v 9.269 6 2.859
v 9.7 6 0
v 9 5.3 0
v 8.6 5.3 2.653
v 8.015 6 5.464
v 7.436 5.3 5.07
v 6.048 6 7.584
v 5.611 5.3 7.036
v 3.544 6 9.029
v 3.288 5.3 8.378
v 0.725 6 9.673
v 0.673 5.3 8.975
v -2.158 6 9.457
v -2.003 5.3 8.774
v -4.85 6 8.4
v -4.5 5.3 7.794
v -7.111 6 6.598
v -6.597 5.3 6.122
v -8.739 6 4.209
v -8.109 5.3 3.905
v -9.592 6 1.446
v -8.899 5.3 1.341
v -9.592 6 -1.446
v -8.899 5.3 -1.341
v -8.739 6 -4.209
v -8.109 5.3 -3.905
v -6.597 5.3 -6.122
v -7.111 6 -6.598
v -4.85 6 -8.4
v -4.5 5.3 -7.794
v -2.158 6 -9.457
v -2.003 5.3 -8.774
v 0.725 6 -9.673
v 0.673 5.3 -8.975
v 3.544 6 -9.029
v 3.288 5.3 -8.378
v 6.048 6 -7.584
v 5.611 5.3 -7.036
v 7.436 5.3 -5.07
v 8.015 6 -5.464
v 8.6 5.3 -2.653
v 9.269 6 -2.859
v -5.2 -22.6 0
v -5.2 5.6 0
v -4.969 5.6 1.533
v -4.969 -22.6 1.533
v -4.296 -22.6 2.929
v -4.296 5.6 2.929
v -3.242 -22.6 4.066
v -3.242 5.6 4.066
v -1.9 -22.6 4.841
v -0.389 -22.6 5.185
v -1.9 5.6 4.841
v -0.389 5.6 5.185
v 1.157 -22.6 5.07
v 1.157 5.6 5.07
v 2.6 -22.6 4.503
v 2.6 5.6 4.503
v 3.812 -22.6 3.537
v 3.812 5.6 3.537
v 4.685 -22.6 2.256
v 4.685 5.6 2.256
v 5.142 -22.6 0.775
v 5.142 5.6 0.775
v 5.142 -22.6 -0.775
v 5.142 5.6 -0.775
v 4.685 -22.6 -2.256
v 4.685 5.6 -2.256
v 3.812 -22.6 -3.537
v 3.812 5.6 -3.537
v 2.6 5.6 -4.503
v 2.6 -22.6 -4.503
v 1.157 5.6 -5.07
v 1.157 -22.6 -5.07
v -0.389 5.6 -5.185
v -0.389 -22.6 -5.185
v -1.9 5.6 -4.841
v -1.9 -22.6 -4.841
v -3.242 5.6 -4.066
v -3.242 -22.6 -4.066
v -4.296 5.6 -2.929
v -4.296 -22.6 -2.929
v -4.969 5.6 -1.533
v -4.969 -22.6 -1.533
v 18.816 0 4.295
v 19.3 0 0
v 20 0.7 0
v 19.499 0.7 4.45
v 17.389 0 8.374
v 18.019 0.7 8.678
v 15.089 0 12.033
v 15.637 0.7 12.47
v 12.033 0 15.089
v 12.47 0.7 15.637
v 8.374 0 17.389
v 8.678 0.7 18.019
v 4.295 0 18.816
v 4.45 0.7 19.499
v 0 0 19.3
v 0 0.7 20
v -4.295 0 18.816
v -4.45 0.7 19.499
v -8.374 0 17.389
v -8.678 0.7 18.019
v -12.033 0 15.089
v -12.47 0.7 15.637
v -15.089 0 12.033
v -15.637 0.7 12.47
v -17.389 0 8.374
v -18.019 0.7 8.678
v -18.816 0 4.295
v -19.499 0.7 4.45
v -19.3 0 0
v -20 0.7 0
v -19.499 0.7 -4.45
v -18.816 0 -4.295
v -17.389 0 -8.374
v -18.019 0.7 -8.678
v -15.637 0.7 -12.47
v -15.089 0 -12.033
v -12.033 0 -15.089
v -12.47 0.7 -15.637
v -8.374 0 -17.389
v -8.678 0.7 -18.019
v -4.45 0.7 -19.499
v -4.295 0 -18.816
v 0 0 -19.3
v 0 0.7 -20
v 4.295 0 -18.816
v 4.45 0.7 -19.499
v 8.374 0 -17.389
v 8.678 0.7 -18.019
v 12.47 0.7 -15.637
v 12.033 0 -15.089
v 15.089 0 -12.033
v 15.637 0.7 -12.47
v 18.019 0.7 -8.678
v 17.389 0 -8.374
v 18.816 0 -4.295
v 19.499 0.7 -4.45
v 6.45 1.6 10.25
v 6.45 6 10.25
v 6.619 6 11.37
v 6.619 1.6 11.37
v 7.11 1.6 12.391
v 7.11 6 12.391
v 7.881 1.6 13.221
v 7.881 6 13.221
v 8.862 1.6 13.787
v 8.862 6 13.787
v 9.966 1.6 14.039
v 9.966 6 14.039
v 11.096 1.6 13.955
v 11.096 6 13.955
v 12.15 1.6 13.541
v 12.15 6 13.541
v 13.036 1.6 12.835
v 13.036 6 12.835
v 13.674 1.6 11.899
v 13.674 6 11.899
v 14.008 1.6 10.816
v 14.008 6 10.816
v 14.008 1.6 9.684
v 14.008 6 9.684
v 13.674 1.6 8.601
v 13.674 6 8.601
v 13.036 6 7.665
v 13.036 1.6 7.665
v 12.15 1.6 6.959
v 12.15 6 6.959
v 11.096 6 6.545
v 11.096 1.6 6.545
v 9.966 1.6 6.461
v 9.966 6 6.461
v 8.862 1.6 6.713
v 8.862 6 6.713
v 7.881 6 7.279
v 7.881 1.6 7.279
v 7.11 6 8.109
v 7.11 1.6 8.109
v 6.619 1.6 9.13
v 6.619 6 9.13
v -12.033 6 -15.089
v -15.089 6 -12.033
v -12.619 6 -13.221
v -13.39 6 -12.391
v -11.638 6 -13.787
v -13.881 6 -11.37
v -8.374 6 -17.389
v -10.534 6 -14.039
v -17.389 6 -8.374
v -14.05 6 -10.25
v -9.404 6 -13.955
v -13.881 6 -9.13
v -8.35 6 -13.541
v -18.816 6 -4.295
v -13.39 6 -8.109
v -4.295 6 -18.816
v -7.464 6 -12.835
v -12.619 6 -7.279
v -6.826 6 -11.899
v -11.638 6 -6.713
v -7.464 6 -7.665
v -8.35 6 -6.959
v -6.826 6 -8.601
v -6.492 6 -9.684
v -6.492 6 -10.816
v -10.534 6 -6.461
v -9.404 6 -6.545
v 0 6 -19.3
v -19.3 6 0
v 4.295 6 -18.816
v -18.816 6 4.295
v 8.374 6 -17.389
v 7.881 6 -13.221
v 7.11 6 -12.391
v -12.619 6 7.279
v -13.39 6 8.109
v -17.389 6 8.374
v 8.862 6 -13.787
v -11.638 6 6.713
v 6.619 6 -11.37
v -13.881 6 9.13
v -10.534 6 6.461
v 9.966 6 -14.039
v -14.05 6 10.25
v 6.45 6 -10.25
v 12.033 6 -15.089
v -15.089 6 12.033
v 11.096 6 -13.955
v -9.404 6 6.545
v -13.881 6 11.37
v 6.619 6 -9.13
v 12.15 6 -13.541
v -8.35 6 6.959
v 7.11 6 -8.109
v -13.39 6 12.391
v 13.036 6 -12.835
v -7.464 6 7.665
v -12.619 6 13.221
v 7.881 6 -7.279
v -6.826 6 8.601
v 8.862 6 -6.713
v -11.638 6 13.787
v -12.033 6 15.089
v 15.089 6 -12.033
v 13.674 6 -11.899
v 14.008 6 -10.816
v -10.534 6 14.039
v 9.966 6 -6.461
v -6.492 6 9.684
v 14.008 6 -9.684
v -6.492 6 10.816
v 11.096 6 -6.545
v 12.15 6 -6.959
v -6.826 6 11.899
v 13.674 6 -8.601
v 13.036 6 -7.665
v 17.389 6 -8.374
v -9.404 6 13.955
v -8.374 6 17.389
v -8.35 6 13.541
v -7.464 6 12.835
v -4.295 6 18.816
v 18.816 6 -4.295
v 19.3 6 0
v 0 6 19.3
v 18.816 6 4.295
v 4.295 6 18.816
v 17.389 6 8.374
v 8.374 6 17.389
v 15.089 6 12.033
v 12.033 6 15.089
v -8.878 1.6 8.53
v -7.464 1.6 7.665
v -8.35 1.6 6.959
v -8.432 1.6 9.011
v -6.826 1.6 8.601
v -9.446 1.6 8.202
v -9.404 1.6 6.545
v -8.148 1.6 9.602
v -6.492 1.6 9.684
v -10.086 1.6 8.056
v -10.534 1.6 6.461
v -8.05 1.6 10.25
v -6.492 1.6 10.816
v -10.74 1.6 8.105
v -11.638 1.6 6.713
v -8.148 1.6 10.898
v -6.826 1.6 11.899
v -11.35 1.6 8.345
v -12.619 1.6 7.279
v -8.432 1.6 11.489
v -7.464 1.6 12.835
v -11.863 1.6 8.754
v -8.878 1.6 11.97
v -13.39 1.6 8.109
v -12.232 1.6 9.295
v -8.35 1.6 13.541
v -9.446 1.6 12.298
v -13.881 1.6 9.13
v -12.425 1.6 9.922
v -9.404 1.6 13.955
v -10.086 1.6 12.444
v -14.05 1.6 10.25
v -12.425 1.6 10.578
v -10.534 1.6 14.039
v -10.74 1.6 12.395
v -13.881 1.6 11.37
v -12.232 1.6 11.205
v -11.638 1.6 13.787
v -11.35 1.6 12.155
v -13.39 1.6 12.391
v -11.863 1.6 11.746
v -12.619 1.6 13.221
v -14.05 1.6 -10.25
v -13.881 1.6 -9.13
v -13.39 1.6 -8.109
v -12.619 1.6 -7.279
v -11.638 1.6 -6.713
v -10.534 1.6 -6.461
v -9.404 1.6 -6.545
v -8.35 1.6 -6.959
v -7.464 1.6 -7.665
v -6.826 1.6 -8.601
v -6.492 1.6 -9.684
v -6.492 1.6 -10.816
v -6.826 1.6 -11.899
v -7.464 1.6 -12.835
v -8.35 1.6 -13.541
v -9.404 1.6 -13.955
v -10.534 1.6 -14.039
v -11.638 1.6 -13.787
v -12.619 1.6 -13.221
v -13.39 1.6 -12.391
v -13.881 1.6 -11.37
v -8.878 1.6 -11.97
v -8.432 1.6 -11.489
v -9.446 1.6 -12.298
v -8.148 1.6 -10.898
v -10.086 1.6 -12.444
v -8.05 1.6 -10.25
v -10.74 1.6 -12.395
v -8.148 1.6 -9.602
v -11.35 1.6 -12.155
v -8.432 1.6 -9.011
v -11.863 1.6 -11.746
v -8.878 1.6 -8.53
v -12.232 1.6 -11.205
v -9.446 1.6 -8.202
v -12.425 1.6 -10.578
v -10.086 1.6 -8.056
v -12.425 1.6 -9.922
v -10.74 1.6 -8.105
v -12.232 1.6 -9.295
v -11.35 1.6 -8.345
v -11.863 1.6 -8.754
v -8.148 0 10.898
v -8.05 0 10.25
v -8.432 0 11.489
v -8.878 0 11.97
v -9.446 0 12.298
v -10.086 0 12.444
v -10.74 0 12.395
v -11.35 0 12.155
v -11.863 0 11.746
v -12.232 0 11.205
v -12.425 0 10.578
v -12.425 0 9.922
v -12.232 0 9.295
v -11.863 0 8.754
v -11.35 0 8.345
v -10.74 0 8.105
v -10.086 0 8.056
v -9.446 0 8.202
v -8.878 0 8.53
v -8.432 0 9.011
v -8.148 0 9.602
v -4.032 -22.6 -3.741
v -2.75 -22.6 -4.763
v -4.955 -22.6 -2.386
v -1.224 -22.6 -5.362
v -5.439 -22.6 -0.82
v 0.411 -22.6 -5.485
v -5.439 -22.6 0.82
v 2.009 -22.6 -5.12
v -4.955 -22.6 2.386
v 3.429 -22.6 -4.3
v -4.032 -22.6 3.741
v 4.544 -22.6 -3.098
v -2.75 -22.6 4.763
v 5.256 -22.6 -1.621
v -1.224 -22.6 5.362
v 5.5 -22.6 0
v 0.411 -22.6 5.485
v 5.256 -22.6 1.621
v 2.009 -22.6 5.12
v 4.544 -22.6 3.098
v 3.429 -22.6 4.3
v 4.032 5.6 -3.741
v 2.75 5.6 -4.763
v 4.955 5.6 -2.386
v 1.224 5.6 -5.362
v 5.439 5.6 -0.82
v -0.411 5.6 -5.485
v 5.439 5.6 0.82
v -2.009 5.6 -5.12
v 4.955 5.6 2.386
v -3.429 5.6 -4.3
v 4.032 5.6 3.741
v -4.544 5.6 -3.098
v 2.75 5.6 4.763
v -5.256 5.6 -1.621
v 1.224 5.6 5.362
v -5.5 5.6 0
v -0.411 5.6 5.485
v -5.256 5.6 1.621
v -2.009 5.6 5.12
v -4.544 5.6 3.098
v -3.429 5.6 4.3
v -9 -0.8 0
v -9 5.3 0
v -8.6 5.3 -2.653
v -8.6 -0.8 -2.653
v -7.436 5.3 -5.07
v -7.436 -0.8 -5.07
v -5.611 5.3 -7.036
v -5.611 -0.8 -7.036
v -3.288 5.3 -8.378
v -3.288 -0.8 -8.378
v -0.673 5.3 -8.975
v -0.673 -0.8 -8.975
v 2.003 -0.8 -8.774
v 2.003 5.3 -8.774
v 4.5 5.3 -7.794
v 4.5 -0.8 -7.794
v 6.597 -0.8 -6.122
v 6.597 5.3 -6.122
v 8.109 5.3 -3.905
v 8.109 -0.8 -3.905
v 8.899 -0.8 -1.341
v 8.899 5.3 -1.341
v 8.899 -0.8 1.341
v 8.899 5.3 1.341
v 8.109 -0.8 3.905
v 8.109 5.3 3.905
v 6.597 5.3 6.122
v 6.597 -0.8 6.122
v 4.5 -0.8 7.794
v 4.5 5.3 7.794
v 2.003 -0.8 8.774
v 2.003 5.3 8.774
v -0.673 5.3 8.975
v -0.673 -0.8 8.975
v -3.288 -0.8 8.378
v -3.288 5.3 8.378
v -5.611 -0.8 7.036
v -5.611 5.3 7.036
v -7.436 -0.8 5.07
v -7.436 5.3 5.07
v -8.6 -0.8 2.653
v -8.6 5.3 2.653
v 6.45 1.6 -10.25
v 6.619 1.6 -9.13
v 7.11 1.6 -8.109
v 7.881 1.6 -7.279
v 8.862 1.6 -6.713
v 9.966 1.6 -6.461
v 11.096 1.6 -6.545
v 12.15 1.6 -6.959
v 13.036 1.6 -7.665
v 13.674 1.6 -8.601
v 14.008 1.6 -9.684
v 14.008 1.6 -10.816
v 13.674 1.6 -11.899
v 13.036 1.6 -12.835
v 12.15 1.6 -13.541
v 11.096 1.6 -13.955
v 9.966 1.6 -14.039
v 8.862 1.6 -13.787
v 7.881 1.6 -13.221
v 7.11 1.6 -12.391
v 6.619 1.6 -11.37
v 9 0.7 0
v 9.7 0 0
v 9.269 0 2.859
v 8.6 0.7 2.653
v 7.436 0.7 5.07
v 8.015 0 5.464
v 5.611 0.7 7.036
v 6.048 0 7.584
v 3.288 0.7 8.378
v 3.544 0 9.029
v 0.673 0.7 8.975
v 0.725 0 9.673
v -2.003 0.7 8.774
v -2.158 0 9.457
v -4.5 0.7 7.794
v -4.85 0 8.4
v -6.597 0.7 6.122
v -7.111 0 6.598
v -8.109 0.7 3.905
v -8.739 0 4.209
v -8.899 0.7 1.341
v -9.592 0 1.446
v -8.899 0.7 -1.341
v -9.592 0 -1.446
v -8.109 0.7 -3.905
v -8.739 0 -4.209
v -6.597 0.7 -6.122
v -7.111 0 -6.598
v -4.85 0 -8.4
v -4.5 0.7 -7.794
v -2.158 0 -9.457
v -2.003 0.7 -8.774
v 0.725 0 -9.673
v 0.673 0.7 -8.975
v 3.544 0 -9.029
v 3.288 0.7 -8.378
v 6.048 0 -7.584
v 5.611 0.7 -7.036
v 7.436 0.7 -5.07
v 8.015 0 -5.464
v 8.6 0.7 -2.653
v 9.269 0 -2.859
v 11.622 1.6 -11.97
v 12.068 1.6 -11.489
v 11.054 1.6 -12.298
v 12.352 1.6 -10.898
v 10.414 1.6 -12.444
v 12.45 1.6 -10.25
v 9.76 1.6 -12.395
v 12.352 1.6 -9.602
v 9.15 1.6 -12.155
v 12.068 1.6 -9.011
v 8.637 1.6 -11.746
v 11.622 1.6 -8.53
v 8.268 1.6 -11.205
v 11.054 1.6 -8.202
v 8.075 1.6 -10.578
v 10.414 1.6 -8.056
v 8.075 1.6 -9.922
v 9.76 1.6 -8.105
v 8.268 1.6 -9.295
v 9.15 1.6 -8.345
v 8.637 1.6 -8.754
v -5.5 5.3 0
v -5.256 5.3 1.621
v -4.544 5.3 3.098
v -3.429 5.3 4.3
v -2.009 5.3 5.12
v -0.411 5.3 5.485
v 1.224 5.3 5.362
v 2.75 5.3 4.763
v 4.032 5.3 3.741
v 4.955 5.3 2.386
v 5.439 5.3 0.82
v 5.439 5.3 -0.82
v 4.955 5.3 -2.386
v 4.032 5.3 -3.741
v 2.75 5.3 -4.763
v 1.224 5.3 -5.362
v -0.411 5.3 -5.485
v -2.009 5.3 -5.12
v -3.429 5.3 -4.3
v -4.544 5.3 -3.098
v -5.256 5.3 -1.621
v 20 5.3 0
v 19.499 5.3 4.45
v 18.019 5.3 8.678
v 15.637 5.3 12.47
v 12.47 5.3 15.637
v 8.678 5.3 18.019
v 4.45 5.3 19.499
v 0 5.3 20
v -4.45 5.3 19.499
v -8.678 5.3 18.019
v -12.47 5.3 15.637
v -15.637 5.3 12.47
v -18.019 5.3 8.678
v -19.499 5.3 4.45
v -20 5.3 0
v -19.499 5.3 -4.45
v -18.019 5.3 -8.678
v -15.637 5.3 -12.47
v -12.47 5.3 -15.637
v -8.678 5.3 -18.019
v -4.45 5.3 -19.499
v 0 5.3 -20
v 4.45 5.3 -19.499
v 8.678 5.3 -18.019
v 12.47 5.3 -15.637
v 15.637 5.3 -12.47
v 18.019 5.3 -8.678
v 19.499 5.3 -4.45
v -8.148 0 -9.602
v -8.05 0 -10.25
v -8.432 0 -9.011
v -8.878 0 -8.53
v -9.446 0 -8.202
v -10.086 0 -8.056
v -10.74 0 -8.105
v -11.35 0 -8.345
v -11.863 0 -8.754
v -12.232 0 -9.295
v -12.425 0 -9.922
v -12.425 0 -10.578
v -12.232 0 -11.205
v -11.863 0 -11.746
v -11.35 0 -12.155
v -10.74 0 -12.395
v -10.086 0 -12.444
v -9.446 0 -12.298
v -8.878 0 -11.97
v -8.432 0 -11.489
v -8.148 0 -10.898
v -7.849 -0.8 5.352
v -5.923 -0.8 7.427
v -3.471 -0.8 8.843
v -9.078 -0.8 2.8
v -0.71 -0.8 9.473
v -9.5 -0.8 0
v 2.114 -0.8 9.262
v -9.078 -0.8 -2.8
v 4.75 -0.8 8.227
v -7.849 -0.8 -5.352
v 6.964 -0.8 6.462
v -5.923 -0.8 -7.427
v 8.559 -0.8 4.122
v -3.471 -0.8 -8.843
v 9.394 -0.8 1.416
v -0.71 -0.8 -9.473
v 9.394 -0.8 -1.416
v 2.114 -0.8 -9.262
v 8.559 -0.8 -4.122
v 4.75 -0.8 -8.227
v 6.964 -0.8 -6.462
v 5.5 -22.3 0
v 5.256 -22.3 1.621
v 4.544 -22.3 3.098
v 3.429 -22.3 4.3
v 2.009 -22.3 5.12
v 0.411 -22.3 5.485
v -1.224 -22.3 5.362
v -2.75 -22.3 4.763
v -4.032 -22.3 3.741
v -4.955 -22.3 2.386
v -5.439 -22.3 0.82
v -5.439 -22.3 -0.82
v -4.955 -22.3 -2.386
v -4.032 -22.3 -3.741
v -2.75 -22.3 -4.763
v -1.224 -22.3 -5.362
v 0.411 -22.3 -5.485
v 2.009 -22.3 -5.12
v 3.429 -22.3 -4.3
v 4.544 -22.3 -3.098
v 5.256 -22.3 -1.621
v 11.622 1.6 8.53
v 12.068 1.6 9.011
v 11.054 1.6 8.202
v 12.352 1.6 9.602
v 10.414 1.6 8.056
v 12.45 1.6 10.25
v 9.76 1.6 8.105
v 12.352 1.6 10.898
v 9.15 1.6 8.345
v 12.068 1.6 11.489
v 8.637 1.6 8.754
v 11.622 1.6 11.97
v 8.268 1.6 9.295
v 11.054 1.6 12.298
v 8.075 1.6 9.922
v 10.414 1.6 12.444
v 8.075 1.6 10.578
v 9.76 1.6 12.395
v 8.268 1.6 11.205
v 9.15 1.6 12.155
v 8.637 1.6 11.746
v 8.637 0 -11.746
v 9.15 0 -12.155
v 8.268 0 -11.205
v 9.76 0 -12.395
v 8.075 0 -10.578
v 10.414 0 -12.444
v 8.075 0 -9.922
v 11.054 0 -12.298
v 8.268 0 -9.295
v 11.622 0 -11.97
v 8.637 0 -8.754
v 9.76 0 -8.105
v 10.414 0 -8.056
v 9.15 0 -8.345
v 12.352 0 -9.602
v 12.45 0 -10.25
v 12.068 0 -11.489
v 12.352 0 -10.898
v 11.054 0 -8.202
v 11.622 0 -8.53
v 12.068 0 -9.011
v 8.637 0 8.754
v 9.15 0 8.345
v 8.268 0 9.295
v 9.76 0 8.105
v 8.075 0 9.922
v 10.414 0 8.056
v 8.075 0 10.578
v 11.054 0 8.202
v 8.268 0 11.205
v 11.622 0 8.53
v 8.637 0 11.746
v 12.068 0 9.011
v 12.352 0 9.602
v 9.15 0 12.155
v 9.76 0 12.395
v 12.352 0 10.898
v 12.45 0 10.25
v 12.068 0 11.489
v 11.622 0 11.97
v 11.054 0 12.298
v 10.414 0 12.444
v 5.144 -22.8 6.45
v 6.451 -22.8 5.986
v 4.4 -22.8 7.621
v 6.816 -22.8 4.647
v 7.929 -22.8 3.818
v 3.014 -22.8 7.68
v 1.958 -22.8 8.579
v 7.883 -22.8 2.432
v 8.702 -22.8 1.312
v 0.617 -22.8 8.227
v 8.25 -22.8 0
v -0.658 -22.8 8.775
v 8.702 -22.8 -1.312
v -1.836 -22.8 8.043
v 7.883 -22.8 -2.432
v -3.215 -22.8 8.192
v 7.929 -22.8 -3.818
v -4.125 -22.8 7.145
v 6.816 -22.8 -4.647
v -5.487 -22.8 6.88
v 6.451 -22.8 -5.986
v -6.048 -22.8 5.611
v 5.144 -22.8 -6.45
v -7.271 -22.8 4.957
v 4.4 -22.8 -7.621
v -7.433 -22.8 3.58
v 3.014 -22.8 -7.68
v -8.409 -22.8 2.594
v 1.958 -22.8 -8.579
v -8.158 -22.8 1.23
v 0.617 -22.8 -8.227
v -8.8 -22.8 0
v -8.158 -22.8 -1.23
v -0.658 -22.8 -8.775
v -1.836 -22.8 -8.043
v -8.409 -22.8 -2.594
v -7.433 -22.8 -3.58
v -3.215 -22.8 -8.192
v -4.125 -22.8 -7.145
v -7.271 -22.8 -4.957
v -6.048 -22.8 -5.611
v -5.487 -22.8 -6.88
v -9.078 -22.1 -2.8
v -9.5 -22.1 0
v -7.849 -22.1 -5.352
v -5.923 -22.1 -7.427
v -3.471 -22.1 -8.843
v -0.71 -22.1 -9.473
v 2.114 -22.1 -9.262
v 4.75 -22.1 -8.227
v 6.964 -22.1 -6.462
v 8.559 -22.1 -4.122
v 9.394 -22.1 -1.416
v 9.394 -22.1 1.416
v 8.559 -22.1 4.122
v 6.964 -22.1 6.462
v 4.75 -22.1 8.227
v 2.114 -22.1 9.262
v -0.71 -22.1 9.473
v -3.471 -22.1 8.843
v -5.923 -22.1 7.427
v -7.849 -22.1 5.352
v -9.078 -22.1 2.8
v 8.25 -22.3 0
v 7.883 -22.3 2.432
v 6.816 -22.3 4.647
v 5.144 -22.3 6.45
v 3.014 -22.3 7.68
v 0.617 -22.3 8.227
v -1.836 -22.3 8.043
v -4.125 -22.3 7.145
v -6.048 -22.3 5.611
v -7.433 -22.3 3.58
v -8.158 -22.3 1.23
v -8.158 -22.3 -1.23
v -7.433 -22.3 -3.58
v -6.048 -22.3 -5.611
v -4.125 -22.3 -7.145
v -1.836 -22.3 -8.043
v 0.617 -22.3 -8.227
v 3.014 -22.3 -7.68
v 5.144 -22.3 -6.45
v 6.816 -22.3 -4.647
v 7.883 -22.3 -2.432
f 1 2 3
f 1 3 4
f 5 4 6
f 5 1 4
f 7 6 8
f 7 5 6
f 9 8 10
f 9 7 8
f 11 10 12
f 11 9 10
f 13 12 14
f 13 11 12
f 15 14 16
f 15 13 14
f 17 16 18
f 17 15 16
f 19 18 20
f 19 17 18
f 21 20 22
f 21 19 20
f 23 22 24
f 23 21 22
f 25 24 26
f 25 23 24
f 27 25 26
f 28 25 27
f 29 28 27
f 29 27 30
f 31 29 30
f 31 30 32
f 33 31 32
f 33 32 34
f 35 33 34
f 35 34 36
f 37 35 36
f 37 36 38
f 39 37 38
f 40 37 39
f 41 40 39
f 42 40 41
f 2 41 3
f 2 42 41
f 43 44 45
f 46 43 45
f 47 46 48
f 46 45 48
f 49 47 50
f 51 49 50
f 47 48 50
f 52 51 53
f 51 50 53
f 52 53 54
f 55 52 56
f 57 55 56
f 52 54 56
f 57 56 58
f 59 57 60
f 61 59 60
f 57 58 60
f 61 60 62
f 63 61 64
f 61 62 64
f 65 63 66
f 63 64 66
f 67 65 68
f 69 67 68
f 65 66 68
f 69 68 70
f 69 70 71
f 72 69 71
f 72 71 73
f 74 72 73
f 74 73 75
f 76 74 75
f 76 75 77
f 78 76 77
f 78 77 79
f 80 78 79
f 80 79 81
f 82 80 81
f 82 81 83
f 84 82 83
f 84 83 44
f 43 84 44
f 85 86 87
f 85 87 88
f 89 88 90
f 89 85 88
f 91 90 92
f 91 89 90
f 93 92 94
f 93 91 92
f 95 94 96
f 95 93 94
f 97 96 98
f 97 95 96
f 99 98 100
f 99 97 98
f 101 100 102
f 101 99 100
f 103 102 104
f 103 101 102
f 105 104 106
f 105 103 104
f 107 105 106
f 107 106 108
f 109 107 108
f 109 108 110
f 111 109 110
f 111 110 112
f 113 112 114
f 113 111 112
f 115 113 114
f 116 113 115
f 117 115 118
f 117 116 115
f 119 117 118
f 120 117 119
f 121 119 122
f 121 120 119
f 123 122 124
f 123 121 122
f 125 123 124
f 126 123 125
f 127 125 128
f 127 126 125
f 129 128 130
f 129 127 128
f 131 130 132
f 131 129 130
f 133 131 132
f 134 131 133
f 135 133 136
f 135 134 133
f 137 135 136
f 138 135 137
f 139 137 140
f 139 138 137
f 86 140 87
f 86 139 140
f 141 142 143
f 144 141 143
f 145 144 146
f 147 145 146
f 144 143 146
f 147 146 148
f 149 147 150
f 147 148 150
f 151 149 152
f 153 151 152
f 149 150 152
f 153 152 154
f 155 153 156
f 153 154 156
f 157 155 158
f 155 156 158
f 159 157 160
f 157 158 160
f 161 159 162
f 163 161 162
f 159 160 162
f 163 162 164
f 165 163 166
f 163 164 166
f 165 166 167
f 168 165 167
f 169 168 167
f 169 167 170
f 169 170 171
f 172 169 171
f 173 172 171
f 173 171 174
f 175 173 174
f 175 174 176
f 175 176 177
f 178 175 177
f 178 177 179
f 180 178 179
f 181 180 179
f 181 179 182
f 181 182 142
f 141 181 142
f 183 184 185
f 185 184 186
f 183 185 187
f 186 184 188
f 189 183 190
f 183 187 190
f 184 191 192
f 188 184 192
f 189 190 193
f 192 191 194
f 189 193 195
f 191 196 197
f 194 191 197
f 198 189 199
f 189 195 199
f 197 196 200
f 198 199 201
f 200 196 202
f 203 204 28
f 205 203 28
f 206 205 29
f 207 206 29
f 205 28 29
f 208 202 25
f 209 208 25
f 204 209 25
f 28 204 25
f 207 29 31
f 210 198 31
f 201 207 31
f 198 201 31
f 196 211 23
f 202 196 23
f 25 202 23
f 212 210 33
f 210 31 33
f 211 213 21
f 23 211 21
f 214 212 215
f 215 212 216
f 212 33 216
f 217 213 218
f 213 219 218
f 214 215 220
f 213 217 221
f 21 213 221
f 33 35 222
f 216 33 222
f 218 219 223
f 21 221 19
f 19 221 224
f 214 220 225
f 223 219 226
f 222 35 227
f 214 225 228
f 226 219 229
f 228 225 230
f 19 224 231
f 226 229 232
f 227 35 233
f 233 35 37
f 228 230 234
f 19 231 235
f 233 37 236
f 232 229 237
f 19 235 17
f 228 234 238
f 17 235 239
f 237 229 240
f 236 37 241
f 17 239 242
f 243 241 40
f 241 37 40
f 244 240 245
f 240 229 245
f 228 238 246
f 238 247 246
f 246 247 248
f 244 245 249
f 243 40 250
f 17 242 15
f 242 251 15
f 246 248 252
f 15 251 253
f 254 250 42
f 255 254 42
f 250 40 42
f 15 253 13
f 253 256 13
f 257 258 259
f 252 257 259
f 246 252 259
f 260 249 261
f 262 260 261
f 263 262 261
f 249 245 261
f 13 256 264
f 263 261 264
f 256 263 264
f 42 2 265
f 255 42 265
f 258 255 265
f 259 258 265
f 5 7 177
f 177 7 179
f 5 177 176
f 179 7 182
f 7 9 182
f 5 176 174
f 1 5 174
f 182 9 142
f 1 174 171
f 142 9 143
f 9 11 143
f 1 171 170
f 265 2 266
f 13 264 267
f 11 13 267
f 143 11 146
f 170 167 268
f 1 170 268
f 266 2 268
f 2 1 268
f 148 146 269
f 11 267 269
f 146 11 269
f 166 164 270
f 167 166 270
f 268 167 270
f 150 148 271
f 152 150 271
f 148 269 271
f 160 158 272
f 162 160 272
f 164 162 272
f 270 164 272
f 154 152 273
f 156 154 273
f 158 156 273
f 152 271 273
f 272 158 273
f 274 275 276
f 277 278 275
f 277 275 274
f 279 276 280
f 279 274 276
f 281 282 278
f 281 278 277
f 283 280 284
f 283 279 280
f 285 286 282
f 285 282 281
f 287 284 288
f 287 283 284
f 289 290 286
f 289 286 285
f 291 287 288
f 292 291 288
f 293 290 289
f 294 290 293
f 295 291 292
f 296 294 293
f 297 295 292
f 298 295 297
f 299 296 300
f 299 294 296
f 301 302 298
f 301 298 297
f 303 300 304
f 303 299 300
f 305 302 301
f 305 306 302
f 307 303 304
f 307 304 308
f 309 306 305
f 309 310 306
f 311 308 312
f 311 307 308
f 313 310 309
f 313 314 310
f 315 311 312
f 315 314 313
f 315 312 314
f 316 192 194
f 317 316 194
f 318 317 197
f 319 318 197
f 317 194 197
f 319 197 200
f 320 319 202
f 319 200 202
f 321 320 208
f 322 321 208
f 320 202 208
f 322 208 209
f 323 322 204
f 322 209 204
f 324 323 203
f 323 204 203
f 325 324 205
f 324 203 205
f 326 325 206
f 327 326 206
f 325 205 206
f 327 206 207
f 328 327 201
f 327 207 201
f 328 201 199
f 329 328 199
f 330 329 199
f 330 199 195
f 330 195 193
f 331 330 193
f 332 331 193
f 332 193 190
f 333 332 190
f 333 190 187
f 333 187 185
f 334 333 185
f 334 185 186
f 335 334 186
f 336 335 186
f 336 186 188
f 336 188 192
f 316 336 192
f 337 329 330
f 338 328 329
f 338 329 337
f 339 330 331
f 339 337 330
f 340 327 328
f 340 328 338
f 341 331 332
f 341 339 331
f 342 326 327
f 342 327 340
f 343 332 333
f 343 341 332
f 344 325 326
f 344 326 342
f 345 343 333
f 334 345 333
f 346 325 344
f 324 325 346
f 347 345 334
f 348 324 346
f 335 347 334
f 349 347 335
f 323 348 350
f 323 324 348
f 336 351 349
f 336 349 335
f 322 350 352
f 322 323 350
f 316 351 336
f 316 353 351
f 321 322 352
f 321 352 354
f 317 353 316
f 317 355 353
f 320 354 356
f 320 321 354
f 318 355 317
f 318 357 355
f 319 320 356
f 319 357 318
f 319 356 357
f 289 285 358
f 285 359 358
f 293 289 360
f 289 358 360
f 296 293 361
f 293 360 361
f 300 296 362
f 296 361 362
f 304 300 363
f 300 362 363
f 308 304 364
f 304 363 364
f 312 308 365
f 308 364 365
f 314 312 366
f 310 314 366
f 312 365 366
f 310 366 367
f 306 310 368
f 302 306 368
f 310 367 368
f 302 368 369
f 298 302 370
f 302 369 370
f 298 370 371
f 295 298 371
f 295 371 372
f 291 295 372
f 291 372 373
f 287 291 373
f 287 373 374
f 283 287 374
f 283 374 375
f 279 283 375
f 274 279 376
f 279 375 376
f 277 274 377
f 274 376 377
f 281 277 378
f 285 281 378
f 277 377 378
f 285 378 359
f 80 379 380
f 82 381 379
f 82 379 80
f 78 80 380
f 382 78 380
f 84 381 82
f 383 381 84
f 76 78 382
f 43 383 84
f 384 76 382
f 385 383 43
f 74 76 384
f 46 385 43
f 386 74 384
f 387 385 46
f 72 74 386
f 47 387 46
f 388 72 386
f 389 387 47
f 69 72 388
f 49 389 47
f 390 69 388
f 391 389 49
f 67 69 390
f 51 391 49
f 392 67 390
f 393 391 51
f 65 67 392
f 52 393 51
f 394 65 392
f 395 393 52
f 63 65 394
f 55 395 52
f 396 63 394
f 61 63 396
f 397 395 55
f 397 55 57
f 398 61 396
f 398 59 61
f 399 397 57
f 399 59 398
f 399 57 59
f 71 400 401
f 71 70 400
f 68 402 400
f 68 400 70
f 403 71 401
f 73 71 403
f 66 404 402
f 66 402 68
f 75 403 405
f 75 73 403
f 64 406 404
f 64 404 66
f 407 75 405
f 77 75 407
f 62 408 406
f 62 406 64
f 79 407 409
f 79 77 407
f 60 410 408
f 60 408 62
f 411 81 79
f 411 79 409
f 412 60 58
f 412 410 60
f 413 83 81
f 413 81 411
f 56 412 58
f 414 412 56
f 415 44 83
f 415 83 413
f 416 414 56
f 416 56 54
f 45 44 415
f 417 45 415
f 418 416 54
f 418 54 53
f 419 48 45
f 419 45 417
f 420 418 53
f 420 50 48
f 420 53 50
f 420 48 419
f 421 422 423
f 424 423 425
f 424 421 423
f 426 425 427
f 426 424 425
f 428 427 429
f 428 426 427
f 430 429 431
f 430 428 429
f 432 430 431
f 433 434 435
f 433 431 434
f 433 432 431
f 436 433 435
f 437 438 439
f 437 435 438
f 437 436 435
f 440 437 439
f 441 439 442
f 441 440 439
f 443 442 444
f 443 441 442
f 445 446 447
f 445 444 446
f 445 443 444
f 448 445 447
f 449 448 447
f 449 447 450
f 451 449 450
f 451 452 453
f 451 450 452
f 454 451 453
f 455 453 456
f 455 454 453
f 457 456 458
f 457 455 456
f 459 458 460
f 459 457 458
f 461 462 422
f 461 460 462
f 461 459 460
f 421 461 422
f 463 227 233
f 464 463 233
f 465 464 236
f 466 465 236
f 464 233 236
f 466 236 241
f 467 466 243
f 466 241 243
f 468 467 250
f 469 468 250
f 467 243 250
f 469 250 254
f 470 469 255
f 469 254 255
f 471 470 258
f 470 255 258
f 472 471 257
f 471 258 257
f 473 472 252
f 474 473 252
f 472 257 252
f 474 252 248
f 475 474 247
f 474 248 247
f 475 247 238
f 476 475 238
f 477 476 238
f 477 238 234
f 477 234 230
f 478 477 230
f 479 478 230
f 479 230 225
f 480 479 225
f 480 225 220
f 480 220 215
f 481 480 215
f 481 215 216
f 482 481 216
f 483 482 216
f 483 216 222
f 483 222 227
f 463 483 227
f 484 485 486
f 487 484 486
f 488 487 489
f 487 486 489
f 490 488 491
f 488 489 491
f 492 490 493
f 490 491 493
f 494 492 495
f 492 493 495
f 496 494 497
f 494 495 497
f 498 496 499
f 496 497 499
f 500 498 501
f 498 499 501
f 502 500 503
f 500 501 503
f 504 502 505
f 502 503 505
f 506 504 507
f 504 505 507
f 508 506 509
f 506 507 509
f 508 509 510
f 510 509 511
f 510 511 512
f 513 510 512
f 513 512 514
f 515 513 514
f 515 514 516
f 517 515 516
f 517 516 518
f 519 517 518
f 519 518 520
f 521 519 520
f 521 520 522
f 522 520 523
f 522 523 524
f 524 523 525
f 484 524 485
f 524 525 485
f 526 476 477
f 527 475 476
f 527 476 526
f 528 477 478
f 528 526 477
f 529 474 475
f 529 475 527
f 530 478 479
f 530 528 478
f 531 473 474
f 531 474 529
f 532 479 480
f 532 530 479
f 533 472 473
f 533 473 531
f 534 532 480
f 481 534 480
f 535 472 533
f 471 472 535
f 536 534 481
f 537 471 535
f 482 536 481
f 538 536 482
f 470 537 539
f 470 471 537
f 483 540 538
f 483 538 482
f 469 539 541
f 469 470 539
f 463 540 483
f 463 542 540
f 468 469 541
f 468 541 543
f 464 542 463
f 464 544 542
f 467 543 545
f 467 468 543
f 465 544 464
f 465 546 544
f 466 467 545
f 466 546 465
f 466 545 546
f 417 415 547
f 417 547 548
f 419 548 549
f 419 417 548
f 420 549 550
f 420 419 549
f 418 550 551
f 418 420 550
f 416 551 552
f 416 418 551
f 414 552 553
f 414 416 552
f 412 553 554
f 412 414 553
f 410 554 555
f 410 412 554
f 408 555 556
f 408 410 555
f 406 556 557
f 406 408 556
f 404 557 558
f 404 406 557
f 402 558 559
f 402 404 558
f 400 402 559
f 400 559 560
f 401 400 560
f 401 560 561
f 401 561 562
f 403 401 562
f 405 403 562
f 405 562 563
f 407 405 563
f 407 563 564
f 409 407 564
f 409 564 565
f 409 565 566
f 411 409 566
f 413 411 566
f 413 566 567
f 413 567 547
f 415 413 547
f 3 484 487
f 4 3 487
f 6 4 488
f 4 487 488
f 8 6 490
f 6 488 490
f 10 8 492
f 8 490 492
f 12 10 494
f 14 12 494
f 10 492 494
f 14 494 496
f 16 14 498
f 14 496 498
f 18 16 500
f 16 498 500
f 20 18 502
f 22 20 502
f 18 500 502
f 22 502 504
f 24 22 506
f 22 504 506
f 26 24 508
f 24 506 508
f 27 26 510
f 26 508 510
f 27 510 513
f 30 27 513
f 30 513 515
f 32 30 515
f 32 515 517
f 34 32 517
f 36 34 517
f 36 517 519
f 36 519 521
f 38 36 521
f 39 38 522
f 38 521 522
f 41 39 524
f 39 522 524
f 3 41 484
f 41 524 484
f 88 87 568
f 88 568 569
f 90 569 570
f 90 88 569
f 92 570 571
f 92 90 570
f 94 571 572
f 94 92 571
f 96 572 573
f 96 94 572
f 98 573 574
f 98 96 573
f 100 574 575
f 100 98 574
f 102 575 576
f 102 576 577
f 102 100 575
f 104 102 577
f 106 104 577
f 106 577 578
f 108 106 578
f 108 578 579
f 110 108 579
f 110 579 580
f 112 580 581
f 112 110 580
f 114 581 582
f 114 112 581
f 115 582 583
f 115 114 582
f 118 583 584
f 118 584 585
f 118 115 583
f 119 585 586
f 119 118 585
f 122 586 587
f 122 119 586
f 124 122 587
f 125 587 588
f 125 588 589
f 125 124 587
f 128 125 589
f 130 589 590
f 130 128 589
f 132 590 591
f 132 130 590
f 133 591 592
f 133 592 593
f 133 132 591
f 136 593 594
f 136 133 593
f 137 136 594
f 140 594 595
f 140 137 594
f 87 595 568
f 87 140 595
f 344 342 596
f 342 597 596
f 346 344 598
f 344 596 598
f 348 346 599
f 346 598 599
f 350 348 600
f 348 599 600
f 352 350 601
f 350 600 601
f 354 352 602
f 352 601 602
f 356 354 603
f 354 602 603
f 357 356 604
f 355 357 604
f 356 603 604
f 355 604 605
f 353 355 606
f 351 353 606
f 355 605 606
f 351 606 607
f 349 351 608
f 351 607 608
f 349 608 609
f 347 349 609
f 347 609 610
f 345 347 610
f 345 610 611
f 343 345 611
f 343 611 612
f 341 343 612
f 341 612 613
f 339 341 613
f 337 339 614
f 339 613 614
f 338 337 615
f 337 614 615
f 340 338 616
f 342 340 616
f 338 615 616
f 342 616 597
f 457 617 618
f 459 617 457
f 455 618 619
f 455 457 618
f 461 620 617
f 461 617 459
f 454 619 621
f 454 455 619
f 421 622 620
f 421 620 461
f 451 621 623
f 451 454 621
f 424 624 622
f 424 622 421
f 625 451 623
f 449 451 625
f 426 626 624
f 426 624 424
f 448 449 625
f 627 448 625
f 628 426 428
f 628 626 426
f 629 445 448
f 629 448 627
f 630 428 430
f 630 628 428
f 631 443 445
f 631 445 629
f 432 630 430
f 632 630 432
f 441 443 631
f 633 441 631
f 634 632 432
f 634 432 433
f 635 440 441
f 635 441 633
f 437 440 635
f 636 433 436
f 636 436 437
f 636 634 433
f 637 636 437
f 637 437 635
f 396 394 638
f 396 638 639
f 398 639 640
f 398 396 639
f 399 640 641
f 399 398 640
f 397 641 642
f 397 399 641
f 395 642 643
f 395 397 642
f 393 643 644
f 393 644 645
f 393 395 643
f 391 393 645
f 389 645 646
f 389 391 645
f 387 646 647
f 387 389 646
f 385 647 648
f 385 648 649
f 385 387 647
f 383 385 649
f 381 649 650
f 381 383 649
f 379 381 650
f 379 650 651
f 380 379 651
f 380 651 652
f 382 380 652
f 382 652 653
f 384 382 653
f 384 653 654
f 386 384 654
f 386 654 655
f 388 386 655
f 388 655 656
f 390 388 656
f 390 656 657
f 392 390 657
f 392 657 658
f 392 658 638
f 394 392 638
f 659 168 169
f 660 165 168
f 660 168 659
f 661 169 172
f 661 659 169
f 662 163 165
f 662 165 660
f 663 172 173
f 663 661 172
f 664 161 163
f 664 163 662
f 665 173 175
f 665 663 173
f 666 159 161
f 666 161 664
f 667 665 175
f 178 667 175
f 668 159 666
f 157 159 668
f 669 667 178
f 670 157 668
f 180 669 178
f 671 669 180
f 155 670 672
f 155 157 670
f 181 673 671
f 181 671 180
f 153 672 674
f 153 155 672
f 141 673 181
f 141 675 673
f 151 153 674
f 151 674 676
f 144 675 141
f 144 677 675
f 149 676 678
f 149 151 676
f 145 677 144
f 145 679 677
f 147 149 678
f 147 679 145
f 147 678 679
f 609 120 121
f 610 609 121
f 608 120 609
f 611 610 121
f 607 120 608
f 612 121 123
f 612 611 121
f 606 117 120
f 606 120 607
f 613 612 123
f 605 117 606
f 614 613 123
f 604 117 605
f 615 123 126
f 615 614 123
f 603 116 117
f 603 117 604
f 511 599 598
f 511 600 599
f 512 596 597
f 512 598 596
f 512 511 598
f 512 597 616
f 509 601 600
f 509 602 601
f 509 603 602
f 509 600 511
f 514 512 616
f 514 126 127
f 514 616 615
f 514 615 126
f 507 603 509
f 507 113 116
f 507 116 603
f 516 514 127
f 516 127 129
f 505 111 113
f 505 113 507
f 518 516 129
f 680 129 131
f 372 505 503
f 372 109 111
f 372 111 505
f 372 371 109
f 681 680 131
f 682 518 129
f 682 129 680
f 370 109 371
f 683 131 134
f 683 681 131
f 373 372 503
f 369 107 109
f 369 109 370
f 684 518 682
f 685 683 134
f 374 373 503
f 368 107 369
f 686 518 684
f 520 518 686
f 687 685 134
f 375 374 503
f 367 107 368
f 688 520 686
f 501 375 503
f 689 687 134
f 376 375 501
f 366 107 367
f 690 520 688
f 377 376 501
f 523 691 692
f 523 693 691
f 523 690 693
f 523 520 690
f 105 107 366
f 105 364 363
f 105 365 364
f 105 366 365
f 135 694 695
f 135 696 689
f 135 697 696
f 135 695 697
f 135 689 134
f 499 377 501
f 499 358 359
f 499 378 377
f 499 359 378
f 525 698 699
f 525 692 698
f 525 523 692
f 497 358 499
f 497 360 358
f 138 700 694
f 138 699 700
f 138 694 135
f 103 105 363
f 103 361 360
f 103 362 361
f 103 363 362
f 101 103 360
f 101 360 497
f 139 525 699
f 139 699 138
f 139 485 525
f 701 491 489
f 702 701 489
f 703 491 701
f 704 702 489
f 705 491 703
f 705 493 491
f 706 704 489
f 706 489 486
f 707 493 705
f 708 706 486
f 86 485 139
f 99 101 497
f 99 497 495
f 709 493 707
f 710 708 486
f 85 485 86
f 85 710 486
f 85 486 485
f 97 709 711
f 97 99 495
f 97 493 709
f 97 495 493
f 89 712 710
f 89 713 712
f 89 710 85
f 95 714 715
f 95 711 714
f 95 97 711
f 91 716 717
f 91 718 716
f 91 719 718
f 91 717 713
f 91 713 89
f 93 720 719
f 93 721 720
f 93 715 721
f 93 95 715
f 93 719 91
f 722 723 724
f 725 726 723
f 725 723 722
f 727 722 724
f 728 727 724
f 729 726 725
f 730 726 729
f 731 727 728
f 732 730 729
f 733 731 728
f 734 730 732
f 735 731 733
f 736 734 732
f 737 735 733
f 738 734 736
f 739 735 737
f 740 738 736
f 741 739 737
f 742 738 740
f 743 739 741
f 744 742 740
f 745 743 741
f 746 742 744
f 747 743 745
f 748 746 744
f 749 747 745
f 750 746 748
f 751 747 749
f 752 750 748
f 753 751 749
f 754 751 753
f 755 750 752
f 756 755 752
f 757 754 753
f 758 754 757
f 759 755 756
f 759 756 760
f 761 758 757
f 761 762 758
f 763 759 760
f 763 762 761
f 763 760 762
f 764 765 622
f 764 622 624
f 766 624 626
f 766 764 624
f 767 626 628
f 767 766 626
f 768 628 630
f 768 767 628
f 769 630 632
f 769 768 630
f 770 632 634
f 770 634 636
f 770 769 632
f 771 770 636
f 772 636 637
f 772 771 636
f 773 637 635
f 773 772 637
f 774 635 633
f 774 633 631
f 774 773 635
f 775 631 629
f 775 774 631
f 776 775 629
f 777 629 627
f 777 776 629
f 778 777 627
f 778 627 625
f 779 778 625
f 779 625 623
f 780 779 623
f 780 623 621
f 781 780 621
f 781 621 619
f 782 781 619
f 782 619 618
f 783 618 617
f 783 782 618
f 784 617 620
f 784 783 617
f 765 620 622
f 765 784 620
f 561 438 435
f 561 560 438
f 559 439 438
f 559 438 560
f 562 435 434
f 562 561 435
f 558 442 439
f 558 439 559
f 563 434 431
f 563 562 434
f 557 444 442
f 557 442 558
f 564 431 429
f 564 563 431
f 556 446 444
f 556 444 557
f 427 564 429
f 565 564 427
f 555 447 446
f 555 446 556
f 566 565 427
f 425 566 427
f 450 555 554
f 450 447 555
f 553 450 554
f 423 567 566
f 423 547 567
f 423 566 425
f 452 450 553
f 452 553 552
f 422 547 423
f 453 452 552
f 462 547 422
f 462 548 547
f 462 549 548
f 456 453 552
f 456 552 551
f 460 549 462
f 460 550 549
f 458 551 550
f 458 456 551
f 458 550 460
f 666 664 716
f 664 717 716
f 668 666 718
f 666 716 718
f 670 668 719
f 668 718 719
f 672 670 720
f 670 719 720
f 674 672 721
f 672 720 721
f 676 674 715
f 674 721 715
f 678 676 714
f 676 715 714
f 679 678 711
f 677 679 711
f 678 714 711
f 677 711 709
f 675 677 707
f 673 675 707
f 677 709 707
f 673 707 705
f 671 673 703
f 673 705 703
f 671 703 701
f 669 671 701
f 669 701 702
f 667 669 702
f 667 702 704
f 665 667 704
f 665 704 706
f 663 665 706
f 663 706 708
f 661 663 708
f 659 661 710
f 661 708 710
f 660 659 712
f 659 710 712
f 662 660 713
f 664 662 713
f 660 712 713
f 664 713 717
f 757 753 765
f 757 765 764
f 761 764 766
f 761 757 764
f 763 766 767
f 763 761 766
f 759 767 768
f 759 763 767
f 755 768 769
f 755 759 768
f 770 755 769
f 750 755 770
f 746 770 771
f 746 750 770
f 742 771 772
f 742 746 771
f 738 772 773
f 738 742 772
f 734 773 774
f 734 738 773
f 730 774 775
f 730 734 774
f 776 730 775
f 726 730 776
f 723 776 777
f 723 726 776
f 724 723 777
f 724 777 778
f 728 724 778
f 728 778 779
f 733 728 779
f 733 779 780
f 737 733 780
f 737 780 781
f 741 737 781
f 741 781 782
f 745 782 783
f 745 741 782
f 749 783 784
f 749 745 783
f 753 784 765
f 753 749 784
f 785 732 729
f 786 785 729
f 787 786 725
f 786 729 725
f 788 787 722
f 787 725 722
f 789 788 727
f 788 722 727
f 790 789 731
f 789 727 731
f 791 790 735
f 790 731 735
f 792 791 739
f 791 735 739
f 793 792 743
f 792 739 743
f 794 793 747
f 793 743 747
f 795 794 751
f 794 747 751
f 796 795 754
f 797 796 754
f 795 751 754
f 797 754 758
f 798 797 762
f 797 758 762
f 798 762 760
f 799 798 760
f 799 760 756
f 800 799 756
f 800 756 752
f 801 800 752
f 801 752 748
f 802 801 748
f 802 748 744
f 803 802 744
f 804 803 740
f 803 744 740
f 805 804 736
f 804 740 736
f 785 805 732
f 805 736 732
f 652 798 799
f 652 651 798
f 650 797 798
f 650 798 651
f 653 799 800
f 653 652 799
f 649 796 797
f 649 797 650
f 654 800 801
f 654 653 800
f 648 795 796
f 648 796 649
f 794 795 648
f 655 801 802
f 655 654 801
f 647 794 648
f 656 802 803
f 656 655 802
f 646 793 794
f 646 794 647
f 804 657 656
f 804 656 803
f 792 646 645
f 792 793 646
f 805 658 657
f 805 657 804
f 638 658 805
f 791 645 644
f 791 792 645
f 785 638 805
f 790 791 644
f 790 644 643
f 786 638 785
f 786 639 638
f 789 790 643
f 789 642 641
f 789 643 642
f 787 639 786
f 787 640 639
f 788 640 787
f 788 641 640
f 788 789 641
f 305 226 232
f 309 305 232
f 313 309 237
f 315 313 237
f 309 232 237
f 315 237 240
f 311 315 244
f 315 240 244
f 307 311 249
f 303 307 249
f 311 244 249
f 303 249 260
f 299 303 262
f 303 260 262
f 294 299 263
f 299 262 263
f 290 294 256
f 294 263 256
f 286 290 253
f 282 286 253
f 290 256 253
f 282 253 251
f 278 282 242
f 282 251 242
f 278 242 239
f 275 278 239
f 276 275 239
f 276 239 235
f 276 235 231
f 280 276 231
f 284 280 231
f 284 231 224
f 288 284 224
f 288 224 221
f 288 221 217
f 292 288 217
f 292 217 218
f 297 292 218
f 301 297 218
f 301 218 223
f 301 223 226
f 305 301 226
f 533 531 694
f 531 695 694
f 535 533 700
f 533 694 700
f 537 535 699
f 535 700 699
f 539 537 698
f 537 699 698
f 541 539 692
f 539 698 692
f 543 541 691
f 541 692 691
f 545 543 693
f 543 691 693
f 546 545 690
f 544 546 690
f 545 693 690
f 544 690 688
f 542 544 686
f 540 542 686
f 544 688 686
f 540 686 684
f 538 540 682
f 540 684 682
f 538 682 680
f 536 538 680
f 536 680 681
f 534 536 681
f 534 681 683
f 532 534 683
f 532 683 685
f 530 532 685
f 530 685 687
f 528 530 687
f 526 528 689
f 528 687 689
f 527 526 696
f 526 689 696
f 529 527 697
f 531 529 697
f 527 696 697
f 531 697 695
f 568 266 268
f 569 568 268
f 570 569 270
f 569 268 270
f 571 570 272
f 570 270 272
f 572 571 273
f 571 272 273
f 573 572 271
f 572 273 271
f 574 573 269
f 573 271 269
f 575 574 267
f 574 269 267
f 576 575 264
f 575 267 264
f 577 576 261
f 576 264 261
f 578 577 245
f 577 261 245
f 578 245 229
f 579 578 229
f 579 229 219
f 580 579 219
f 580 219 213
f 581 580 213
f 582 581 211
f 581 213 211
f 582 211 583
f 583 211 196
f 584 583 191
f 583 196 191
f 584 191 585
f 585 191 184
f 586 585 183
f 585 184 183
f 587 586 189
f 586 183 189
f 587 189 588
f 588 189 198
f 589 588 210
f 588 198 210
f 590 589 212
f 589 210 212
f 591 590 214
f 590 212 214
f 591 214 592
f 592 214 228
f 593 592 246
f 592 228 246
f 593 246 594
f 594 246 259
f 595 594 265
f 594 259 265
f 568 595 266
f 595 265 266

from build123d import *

# Parameters (mm, degrees)
F0_R           = 20
F0_R_2         = 9
F1_DEPTH       = 6
F4_SIZE        = 0.7
F6_D           = 4.4
F6_CBORE_D     = 7.6
F6_CBORE_DEPTH = 4.4
F7_SIZE        = 0.7
F8_R           = 9
F8_R_2         = 5.5
F9_DEPTH       = 0.7
F8_R_3         = 5.2
F10_DEPTH      = 0.4
F11_DEPTH      = 28.8
F12_R          = 8.25
F12_R_2        = 5.5
F13_DEPTH      = 0.5
F12_R_3        = 5.2
F14_DEPTH      = 0.2


with BuildPart() as f1:
    # F0 (on Front) → F1 (new body)
    with BuildSketch(Plane.XZ):
        Circle(F0_R)
        Circle(F0_R_2, mode=Mode.SUBTRACT)
    extrude(amount=-F1_DEPTH)

    # F4
    f4_edges = [f1.edges().sort_by_distance(p)[0] for p in [
        (20, 3, 0),
        (-20, 0, 0),
        (-20, 6, 0),
        (9, 3, 0),
        (-9, 0, 0),
        (-9, 6, 0),
    ]]
    chamfer(f4_edges, length=F4_SIZE)

    # F6 (through all)
    with Locations(Plane(origin=(0, 6, 0), x_dir=(-1, 0, 0), z_dir=(0, 1, 0))):
        with Locations((-10.25, 10.25), (10.25, 10.25), (10.25, -10.25), (-10.25, -10.25)):
            CounterBoreHole(F6_D / 2, F6_CBORE_D / 2, F6_CBORE_DEPTH)


with BuildPart() as f3:
    # F2 (on Top) → F3 (revolve)
    with BuildSketch(Plane.XY):
        Polygon((0, -22.8), (0, 6), (-9, 6), (-9, -0.8), (-9.5, -0.8), (-9.5, -22.8), align=None)
    revolve(axis=Axis((0, 15.3594217002, 0), (0, -1, 0)))

    # F7
    f7_edges = [f3.edges().sort_by_distance(p)[0] for p in [
        (9.5, -22.8, 0),
    ]]
    chamfer(f7_edges, length=F7_SIZE)

    # F8 (on face) → F9 (cut)
    with BuildSketch(Plane(origin=(0, 6, 0), x_dir=(-1, 0, 0), z_dir=(0, 1, 0))):
        Circle(F8_R)
        Circle(F8_R_2, mode=Mode.SUBTRACT)
    extrude(amount=-F9_DEPTH, mode=Mode.SUBTRACT)

    # F8 (on face) → F10 (cut)
    with BuildSketch(Plane(origin=(0, 6, 0), x_dir=(-1, 0, 0), z_dir=(0, 1, 0))):
        Circle(F8_R_2)
        Circle(F8_R_3, mode=Mode.SUBTRACT)
    extrude(amount=-F10_DEPTH, mode=Mode.SUBTRACT)

    # F8 (on face) → F11 (cut, through all)
    with BuildSketch(Plane(origin=(0, 6, 0), x_dir=(-1, 0, 0), z_dir=(0, 1, 0))):
        Circle(F8_R_3)
    extrude(amount=-F11_DEPTH, mode=Mode.SUBTRACT)

    # F12 (on face) → F13 (cut)
    with BuildSketch(Plane.XZ.offset(22.8)):
        Circle(F12_R)
        Circle(F12_R_2, mode=Mode.SUBTRACT)
    extrude(amount=-F13_DEPTH, mode=Mode.SUBTRACT)

    # F12 (on face) → F14 (cut)
    with BuildSketch(Plane.XZ.offset(22.8)):
        Circle(F12_R_2)
        Circle(F12_R_3, mode=Mode.SUBTRACT)
    extrude(amount=-F14_DEPTH, mode=Mode.SUBTRACT)


solid = Compound([f1.part, f3.part])
